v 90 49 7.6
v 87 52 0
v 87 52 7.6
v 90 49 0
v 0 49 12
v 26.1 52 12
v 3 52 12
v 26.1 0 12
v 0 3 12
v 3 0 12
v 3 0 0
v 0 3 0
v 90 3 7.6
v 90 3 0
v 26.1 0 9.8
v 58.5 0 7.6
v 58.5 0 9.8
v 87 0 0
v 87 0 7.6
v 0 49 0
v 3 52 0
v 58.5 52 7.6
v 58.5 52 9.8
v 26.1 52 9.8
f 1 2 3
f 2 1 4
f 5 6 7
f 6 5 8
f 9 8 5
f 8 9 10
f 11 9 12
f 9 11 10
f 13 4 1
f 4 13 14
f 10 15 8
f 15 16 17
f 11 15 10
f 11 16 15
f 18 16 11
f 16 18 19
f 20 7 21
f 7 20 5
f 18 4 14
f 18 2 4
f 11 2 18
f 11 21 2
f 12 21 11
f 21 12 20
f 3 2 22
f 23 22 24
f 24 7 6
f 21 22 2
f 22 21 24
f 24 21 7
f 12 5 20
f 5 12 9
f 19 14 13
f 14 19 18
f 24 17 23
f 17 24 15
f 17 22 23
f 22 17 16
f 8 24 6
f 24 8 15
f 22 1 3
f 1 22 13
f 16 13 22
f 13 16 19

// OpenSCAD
$fn = 32;

// ----------------------------------------------------------------------
// Stepped bar: twostep, 90 x 52 x 12/7.6 mm
// ----------------------------------------------------------------------

// --- parameters (mm) ---
bar_l = 90;               // bar length, X
bar_w = 52;               // bar width, Y
plate_t = 12;             // thickness of the thick zone, Z
thin_t = 7.6;             // thickness of the thin zone
corner_c = 3;             // corner chamfer of the bar
step_cut = 4.4;           // material removed from the thin zone
stair1_x = 26.1;          // position of the first stair
stair2_x = 58.5;          // position of the second stair
mid_t = 9.8;              // thickness of the middle zone
depth_1 = 2.2;            // depth of cut 1 from the top face
depth_2 = 4.4;            // depth of cut 2 from the top face

profile = [[3, 0], [87, 0], [90, 3], [90, 49], [87, 52], [3, 52], [0, 49], [0, 3]];  // primary outline, 8 points, counter clockwise
void_1 = [[26.1, -1], [58.5, -1], [58.5, 53], [26.1, 53]];  // first stair, 4 points
void_2 = [[58.5, -1], [91, -1], [91, 53], [58.5, 53]];  // second stair, 4 points

// --- the one profile operation ---
difference() {
  linear_extrude(height = plate_t) polygon(points = profile);
  translate([0, 0, plate_t - depth_1])
    linear_extrude(height = depth_1 + 1) polygon(points = void_1);
  translate([0, 0, plate_t - depth_2])
    linear_extrude(height = depth_2 + 1) polygon(points = void_2);
}
